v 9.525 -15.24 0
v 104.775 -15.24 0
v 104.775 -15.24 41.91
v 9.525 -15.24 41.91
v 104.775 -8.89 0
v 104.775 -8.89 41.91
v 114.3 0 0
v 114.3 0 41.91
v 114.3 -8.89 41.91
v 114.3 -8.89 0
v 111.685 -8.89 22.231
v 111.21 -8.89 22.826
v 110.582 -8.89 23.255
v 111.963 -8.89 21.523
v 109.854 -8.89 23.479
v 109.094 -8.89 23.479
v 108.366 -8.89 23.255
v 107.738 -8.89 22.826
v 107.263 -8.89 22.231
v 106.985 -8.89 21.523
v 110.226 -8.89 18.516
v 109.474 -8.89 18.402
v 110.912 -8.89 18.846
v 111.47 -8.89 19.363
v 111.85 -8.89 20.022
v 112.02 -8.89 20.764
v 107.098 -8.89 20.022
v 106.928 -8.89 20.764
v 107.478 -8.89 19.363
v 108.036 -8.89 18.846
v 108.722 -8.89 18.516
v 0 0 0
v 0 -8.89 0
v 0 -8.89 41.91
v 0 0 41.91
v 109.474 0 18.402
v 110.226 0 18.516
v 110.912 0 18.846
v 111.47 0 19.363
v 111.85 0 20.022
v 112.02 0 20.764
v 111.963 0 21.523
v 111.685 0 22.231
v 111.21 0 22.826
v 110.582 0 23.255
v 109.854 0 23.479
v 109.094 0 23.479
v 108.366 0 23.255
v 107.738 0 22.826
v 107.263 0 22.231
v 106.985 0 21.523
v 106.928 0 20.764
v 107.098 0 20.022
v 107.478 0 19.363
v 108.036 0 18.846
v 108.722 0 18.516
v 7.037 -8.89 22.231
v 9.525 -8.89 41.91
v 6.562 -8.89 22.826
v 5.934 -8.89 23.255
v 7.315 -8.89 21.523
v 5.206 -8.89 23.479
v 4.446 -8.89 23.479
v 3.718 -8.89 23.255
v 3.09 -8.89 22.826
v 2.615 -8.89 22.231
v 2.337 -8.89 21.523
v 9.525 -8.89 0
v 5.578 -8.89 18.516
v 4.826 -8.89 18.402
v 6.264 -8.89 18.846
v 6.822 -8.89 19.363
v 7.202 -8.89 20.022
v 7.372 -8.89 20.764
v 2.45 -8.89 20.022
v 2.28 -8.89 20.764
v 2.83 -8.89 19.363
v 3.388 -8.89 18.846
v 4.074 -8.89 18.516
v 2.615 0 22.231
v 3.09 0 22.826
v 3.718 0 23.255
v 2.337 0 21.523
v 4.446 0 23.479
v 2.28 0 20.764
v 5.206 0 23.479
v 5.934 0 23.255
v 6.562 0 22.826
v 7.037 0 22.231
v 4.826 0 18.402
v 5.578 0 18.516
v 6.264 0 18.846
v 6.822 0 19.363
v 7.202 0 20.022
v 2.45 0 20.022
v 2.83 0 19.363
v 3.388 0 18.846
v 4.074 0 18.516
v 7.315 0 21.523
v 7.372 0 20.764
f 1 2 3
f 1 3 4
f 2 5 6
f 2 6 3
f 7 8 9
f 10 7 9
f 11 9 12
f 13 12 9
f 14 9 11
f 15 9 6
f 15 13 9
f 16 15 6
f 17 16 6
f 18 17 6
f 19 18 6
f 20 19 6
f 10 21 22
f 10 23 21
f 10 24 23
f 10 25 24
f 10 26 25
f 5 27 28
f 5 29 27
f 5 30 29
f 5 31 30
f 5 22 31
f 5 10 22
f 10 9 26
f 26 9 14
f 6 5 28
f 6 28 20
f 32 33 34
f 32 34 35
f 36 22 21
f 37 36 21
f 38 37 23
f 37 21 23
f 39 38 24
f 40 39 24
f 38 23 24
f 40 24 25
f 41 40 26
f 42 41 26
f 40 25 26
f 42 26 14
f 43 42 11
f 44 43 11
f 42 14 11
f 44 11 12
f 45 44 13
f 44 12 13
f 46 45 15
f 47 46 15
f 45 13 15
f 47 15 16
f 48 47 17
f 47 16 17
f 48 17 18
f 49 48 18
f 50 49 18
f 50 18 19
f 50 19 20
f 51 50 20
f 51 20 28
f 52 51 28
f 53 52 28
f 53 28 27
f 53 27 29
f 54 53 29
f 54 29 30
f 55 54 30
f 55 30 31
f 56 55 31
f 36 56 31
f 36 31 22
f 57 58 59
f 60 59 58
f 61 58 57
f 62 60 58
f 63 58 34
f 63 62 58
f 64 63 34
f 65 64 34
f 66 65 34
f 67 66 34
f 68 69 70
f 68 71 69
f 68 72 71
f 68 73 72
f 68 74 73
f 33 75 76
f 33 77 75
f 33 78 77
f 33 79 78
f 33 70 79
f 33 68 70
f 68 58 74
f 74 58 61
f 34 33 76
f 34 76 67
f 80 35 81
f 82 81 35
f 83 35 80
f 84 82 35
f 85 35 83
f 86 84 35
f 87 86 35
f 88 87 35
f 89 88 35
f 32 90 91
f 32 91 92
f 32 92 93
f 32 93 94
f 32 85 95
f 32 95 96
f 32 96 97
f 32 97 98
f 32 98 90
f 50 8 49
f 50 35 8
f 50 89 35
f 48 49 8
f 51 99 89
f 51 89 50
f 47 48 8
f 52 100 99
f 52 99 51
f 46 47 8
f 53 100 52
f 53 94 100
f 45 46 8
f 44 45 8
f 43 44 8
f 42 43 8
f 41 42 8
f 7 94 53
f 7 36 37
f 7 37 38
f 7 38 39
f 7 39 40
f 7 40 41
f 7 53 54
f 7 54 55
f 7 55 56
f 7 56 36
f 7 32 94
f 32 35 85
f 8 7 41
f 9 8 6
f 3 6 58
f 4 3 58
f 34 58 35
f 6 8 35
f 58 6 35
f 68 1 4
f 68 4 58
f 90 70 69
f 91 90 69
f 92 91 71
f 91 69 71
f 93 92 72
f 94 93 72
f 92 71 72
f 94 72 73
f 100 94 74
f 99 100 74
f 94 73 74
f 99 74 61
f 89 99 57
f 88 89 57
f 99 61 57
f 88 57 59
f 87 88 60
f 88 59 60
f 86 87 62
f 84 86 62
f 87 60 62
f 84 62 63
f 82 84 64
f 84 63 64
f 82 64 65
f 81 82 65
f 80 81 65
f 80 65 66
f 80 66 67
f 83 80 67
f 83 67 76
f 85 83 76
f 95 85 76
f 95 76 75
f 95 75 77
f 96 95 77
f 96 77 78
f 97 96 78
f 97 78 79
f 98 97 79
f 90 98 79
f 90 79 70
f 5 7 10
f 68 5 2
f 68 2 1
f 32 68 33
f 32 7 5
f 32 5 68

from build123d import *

# Parameters (mm, degrees)
BOSS_EXTRUDE1_DEPTH    = 41.91
F_10_CLEARANCE_HOLE1_D = 5.1054


with BuildPart() as part:
    # Sketch1 → Boss-Extrude1 (new body)
    with BuildSketch(Plane.XY):
        Polygon((0, 0), (114.3, 0), (114.3, -8.89), (104.775, -8.89), (104.775, -15.24), (9.525, -15.24), (9.525, -8.89), (0, -8.89), align=None)
    extrude(amount=BOSS_EXTRUDE1_DEPTH)

    # #10 Clearance Hole1 (through all)
    with Locations(Plane(origin=(4.826, 0, 20.955), x_dir=(0, 0, 1), z_dir=(0, 1, 0))):
        with Locations((0, 0), (0, 104.648)):
            Hole(F_10_CLEARANCE_HOLE1_D / 2)


solid = part.part
